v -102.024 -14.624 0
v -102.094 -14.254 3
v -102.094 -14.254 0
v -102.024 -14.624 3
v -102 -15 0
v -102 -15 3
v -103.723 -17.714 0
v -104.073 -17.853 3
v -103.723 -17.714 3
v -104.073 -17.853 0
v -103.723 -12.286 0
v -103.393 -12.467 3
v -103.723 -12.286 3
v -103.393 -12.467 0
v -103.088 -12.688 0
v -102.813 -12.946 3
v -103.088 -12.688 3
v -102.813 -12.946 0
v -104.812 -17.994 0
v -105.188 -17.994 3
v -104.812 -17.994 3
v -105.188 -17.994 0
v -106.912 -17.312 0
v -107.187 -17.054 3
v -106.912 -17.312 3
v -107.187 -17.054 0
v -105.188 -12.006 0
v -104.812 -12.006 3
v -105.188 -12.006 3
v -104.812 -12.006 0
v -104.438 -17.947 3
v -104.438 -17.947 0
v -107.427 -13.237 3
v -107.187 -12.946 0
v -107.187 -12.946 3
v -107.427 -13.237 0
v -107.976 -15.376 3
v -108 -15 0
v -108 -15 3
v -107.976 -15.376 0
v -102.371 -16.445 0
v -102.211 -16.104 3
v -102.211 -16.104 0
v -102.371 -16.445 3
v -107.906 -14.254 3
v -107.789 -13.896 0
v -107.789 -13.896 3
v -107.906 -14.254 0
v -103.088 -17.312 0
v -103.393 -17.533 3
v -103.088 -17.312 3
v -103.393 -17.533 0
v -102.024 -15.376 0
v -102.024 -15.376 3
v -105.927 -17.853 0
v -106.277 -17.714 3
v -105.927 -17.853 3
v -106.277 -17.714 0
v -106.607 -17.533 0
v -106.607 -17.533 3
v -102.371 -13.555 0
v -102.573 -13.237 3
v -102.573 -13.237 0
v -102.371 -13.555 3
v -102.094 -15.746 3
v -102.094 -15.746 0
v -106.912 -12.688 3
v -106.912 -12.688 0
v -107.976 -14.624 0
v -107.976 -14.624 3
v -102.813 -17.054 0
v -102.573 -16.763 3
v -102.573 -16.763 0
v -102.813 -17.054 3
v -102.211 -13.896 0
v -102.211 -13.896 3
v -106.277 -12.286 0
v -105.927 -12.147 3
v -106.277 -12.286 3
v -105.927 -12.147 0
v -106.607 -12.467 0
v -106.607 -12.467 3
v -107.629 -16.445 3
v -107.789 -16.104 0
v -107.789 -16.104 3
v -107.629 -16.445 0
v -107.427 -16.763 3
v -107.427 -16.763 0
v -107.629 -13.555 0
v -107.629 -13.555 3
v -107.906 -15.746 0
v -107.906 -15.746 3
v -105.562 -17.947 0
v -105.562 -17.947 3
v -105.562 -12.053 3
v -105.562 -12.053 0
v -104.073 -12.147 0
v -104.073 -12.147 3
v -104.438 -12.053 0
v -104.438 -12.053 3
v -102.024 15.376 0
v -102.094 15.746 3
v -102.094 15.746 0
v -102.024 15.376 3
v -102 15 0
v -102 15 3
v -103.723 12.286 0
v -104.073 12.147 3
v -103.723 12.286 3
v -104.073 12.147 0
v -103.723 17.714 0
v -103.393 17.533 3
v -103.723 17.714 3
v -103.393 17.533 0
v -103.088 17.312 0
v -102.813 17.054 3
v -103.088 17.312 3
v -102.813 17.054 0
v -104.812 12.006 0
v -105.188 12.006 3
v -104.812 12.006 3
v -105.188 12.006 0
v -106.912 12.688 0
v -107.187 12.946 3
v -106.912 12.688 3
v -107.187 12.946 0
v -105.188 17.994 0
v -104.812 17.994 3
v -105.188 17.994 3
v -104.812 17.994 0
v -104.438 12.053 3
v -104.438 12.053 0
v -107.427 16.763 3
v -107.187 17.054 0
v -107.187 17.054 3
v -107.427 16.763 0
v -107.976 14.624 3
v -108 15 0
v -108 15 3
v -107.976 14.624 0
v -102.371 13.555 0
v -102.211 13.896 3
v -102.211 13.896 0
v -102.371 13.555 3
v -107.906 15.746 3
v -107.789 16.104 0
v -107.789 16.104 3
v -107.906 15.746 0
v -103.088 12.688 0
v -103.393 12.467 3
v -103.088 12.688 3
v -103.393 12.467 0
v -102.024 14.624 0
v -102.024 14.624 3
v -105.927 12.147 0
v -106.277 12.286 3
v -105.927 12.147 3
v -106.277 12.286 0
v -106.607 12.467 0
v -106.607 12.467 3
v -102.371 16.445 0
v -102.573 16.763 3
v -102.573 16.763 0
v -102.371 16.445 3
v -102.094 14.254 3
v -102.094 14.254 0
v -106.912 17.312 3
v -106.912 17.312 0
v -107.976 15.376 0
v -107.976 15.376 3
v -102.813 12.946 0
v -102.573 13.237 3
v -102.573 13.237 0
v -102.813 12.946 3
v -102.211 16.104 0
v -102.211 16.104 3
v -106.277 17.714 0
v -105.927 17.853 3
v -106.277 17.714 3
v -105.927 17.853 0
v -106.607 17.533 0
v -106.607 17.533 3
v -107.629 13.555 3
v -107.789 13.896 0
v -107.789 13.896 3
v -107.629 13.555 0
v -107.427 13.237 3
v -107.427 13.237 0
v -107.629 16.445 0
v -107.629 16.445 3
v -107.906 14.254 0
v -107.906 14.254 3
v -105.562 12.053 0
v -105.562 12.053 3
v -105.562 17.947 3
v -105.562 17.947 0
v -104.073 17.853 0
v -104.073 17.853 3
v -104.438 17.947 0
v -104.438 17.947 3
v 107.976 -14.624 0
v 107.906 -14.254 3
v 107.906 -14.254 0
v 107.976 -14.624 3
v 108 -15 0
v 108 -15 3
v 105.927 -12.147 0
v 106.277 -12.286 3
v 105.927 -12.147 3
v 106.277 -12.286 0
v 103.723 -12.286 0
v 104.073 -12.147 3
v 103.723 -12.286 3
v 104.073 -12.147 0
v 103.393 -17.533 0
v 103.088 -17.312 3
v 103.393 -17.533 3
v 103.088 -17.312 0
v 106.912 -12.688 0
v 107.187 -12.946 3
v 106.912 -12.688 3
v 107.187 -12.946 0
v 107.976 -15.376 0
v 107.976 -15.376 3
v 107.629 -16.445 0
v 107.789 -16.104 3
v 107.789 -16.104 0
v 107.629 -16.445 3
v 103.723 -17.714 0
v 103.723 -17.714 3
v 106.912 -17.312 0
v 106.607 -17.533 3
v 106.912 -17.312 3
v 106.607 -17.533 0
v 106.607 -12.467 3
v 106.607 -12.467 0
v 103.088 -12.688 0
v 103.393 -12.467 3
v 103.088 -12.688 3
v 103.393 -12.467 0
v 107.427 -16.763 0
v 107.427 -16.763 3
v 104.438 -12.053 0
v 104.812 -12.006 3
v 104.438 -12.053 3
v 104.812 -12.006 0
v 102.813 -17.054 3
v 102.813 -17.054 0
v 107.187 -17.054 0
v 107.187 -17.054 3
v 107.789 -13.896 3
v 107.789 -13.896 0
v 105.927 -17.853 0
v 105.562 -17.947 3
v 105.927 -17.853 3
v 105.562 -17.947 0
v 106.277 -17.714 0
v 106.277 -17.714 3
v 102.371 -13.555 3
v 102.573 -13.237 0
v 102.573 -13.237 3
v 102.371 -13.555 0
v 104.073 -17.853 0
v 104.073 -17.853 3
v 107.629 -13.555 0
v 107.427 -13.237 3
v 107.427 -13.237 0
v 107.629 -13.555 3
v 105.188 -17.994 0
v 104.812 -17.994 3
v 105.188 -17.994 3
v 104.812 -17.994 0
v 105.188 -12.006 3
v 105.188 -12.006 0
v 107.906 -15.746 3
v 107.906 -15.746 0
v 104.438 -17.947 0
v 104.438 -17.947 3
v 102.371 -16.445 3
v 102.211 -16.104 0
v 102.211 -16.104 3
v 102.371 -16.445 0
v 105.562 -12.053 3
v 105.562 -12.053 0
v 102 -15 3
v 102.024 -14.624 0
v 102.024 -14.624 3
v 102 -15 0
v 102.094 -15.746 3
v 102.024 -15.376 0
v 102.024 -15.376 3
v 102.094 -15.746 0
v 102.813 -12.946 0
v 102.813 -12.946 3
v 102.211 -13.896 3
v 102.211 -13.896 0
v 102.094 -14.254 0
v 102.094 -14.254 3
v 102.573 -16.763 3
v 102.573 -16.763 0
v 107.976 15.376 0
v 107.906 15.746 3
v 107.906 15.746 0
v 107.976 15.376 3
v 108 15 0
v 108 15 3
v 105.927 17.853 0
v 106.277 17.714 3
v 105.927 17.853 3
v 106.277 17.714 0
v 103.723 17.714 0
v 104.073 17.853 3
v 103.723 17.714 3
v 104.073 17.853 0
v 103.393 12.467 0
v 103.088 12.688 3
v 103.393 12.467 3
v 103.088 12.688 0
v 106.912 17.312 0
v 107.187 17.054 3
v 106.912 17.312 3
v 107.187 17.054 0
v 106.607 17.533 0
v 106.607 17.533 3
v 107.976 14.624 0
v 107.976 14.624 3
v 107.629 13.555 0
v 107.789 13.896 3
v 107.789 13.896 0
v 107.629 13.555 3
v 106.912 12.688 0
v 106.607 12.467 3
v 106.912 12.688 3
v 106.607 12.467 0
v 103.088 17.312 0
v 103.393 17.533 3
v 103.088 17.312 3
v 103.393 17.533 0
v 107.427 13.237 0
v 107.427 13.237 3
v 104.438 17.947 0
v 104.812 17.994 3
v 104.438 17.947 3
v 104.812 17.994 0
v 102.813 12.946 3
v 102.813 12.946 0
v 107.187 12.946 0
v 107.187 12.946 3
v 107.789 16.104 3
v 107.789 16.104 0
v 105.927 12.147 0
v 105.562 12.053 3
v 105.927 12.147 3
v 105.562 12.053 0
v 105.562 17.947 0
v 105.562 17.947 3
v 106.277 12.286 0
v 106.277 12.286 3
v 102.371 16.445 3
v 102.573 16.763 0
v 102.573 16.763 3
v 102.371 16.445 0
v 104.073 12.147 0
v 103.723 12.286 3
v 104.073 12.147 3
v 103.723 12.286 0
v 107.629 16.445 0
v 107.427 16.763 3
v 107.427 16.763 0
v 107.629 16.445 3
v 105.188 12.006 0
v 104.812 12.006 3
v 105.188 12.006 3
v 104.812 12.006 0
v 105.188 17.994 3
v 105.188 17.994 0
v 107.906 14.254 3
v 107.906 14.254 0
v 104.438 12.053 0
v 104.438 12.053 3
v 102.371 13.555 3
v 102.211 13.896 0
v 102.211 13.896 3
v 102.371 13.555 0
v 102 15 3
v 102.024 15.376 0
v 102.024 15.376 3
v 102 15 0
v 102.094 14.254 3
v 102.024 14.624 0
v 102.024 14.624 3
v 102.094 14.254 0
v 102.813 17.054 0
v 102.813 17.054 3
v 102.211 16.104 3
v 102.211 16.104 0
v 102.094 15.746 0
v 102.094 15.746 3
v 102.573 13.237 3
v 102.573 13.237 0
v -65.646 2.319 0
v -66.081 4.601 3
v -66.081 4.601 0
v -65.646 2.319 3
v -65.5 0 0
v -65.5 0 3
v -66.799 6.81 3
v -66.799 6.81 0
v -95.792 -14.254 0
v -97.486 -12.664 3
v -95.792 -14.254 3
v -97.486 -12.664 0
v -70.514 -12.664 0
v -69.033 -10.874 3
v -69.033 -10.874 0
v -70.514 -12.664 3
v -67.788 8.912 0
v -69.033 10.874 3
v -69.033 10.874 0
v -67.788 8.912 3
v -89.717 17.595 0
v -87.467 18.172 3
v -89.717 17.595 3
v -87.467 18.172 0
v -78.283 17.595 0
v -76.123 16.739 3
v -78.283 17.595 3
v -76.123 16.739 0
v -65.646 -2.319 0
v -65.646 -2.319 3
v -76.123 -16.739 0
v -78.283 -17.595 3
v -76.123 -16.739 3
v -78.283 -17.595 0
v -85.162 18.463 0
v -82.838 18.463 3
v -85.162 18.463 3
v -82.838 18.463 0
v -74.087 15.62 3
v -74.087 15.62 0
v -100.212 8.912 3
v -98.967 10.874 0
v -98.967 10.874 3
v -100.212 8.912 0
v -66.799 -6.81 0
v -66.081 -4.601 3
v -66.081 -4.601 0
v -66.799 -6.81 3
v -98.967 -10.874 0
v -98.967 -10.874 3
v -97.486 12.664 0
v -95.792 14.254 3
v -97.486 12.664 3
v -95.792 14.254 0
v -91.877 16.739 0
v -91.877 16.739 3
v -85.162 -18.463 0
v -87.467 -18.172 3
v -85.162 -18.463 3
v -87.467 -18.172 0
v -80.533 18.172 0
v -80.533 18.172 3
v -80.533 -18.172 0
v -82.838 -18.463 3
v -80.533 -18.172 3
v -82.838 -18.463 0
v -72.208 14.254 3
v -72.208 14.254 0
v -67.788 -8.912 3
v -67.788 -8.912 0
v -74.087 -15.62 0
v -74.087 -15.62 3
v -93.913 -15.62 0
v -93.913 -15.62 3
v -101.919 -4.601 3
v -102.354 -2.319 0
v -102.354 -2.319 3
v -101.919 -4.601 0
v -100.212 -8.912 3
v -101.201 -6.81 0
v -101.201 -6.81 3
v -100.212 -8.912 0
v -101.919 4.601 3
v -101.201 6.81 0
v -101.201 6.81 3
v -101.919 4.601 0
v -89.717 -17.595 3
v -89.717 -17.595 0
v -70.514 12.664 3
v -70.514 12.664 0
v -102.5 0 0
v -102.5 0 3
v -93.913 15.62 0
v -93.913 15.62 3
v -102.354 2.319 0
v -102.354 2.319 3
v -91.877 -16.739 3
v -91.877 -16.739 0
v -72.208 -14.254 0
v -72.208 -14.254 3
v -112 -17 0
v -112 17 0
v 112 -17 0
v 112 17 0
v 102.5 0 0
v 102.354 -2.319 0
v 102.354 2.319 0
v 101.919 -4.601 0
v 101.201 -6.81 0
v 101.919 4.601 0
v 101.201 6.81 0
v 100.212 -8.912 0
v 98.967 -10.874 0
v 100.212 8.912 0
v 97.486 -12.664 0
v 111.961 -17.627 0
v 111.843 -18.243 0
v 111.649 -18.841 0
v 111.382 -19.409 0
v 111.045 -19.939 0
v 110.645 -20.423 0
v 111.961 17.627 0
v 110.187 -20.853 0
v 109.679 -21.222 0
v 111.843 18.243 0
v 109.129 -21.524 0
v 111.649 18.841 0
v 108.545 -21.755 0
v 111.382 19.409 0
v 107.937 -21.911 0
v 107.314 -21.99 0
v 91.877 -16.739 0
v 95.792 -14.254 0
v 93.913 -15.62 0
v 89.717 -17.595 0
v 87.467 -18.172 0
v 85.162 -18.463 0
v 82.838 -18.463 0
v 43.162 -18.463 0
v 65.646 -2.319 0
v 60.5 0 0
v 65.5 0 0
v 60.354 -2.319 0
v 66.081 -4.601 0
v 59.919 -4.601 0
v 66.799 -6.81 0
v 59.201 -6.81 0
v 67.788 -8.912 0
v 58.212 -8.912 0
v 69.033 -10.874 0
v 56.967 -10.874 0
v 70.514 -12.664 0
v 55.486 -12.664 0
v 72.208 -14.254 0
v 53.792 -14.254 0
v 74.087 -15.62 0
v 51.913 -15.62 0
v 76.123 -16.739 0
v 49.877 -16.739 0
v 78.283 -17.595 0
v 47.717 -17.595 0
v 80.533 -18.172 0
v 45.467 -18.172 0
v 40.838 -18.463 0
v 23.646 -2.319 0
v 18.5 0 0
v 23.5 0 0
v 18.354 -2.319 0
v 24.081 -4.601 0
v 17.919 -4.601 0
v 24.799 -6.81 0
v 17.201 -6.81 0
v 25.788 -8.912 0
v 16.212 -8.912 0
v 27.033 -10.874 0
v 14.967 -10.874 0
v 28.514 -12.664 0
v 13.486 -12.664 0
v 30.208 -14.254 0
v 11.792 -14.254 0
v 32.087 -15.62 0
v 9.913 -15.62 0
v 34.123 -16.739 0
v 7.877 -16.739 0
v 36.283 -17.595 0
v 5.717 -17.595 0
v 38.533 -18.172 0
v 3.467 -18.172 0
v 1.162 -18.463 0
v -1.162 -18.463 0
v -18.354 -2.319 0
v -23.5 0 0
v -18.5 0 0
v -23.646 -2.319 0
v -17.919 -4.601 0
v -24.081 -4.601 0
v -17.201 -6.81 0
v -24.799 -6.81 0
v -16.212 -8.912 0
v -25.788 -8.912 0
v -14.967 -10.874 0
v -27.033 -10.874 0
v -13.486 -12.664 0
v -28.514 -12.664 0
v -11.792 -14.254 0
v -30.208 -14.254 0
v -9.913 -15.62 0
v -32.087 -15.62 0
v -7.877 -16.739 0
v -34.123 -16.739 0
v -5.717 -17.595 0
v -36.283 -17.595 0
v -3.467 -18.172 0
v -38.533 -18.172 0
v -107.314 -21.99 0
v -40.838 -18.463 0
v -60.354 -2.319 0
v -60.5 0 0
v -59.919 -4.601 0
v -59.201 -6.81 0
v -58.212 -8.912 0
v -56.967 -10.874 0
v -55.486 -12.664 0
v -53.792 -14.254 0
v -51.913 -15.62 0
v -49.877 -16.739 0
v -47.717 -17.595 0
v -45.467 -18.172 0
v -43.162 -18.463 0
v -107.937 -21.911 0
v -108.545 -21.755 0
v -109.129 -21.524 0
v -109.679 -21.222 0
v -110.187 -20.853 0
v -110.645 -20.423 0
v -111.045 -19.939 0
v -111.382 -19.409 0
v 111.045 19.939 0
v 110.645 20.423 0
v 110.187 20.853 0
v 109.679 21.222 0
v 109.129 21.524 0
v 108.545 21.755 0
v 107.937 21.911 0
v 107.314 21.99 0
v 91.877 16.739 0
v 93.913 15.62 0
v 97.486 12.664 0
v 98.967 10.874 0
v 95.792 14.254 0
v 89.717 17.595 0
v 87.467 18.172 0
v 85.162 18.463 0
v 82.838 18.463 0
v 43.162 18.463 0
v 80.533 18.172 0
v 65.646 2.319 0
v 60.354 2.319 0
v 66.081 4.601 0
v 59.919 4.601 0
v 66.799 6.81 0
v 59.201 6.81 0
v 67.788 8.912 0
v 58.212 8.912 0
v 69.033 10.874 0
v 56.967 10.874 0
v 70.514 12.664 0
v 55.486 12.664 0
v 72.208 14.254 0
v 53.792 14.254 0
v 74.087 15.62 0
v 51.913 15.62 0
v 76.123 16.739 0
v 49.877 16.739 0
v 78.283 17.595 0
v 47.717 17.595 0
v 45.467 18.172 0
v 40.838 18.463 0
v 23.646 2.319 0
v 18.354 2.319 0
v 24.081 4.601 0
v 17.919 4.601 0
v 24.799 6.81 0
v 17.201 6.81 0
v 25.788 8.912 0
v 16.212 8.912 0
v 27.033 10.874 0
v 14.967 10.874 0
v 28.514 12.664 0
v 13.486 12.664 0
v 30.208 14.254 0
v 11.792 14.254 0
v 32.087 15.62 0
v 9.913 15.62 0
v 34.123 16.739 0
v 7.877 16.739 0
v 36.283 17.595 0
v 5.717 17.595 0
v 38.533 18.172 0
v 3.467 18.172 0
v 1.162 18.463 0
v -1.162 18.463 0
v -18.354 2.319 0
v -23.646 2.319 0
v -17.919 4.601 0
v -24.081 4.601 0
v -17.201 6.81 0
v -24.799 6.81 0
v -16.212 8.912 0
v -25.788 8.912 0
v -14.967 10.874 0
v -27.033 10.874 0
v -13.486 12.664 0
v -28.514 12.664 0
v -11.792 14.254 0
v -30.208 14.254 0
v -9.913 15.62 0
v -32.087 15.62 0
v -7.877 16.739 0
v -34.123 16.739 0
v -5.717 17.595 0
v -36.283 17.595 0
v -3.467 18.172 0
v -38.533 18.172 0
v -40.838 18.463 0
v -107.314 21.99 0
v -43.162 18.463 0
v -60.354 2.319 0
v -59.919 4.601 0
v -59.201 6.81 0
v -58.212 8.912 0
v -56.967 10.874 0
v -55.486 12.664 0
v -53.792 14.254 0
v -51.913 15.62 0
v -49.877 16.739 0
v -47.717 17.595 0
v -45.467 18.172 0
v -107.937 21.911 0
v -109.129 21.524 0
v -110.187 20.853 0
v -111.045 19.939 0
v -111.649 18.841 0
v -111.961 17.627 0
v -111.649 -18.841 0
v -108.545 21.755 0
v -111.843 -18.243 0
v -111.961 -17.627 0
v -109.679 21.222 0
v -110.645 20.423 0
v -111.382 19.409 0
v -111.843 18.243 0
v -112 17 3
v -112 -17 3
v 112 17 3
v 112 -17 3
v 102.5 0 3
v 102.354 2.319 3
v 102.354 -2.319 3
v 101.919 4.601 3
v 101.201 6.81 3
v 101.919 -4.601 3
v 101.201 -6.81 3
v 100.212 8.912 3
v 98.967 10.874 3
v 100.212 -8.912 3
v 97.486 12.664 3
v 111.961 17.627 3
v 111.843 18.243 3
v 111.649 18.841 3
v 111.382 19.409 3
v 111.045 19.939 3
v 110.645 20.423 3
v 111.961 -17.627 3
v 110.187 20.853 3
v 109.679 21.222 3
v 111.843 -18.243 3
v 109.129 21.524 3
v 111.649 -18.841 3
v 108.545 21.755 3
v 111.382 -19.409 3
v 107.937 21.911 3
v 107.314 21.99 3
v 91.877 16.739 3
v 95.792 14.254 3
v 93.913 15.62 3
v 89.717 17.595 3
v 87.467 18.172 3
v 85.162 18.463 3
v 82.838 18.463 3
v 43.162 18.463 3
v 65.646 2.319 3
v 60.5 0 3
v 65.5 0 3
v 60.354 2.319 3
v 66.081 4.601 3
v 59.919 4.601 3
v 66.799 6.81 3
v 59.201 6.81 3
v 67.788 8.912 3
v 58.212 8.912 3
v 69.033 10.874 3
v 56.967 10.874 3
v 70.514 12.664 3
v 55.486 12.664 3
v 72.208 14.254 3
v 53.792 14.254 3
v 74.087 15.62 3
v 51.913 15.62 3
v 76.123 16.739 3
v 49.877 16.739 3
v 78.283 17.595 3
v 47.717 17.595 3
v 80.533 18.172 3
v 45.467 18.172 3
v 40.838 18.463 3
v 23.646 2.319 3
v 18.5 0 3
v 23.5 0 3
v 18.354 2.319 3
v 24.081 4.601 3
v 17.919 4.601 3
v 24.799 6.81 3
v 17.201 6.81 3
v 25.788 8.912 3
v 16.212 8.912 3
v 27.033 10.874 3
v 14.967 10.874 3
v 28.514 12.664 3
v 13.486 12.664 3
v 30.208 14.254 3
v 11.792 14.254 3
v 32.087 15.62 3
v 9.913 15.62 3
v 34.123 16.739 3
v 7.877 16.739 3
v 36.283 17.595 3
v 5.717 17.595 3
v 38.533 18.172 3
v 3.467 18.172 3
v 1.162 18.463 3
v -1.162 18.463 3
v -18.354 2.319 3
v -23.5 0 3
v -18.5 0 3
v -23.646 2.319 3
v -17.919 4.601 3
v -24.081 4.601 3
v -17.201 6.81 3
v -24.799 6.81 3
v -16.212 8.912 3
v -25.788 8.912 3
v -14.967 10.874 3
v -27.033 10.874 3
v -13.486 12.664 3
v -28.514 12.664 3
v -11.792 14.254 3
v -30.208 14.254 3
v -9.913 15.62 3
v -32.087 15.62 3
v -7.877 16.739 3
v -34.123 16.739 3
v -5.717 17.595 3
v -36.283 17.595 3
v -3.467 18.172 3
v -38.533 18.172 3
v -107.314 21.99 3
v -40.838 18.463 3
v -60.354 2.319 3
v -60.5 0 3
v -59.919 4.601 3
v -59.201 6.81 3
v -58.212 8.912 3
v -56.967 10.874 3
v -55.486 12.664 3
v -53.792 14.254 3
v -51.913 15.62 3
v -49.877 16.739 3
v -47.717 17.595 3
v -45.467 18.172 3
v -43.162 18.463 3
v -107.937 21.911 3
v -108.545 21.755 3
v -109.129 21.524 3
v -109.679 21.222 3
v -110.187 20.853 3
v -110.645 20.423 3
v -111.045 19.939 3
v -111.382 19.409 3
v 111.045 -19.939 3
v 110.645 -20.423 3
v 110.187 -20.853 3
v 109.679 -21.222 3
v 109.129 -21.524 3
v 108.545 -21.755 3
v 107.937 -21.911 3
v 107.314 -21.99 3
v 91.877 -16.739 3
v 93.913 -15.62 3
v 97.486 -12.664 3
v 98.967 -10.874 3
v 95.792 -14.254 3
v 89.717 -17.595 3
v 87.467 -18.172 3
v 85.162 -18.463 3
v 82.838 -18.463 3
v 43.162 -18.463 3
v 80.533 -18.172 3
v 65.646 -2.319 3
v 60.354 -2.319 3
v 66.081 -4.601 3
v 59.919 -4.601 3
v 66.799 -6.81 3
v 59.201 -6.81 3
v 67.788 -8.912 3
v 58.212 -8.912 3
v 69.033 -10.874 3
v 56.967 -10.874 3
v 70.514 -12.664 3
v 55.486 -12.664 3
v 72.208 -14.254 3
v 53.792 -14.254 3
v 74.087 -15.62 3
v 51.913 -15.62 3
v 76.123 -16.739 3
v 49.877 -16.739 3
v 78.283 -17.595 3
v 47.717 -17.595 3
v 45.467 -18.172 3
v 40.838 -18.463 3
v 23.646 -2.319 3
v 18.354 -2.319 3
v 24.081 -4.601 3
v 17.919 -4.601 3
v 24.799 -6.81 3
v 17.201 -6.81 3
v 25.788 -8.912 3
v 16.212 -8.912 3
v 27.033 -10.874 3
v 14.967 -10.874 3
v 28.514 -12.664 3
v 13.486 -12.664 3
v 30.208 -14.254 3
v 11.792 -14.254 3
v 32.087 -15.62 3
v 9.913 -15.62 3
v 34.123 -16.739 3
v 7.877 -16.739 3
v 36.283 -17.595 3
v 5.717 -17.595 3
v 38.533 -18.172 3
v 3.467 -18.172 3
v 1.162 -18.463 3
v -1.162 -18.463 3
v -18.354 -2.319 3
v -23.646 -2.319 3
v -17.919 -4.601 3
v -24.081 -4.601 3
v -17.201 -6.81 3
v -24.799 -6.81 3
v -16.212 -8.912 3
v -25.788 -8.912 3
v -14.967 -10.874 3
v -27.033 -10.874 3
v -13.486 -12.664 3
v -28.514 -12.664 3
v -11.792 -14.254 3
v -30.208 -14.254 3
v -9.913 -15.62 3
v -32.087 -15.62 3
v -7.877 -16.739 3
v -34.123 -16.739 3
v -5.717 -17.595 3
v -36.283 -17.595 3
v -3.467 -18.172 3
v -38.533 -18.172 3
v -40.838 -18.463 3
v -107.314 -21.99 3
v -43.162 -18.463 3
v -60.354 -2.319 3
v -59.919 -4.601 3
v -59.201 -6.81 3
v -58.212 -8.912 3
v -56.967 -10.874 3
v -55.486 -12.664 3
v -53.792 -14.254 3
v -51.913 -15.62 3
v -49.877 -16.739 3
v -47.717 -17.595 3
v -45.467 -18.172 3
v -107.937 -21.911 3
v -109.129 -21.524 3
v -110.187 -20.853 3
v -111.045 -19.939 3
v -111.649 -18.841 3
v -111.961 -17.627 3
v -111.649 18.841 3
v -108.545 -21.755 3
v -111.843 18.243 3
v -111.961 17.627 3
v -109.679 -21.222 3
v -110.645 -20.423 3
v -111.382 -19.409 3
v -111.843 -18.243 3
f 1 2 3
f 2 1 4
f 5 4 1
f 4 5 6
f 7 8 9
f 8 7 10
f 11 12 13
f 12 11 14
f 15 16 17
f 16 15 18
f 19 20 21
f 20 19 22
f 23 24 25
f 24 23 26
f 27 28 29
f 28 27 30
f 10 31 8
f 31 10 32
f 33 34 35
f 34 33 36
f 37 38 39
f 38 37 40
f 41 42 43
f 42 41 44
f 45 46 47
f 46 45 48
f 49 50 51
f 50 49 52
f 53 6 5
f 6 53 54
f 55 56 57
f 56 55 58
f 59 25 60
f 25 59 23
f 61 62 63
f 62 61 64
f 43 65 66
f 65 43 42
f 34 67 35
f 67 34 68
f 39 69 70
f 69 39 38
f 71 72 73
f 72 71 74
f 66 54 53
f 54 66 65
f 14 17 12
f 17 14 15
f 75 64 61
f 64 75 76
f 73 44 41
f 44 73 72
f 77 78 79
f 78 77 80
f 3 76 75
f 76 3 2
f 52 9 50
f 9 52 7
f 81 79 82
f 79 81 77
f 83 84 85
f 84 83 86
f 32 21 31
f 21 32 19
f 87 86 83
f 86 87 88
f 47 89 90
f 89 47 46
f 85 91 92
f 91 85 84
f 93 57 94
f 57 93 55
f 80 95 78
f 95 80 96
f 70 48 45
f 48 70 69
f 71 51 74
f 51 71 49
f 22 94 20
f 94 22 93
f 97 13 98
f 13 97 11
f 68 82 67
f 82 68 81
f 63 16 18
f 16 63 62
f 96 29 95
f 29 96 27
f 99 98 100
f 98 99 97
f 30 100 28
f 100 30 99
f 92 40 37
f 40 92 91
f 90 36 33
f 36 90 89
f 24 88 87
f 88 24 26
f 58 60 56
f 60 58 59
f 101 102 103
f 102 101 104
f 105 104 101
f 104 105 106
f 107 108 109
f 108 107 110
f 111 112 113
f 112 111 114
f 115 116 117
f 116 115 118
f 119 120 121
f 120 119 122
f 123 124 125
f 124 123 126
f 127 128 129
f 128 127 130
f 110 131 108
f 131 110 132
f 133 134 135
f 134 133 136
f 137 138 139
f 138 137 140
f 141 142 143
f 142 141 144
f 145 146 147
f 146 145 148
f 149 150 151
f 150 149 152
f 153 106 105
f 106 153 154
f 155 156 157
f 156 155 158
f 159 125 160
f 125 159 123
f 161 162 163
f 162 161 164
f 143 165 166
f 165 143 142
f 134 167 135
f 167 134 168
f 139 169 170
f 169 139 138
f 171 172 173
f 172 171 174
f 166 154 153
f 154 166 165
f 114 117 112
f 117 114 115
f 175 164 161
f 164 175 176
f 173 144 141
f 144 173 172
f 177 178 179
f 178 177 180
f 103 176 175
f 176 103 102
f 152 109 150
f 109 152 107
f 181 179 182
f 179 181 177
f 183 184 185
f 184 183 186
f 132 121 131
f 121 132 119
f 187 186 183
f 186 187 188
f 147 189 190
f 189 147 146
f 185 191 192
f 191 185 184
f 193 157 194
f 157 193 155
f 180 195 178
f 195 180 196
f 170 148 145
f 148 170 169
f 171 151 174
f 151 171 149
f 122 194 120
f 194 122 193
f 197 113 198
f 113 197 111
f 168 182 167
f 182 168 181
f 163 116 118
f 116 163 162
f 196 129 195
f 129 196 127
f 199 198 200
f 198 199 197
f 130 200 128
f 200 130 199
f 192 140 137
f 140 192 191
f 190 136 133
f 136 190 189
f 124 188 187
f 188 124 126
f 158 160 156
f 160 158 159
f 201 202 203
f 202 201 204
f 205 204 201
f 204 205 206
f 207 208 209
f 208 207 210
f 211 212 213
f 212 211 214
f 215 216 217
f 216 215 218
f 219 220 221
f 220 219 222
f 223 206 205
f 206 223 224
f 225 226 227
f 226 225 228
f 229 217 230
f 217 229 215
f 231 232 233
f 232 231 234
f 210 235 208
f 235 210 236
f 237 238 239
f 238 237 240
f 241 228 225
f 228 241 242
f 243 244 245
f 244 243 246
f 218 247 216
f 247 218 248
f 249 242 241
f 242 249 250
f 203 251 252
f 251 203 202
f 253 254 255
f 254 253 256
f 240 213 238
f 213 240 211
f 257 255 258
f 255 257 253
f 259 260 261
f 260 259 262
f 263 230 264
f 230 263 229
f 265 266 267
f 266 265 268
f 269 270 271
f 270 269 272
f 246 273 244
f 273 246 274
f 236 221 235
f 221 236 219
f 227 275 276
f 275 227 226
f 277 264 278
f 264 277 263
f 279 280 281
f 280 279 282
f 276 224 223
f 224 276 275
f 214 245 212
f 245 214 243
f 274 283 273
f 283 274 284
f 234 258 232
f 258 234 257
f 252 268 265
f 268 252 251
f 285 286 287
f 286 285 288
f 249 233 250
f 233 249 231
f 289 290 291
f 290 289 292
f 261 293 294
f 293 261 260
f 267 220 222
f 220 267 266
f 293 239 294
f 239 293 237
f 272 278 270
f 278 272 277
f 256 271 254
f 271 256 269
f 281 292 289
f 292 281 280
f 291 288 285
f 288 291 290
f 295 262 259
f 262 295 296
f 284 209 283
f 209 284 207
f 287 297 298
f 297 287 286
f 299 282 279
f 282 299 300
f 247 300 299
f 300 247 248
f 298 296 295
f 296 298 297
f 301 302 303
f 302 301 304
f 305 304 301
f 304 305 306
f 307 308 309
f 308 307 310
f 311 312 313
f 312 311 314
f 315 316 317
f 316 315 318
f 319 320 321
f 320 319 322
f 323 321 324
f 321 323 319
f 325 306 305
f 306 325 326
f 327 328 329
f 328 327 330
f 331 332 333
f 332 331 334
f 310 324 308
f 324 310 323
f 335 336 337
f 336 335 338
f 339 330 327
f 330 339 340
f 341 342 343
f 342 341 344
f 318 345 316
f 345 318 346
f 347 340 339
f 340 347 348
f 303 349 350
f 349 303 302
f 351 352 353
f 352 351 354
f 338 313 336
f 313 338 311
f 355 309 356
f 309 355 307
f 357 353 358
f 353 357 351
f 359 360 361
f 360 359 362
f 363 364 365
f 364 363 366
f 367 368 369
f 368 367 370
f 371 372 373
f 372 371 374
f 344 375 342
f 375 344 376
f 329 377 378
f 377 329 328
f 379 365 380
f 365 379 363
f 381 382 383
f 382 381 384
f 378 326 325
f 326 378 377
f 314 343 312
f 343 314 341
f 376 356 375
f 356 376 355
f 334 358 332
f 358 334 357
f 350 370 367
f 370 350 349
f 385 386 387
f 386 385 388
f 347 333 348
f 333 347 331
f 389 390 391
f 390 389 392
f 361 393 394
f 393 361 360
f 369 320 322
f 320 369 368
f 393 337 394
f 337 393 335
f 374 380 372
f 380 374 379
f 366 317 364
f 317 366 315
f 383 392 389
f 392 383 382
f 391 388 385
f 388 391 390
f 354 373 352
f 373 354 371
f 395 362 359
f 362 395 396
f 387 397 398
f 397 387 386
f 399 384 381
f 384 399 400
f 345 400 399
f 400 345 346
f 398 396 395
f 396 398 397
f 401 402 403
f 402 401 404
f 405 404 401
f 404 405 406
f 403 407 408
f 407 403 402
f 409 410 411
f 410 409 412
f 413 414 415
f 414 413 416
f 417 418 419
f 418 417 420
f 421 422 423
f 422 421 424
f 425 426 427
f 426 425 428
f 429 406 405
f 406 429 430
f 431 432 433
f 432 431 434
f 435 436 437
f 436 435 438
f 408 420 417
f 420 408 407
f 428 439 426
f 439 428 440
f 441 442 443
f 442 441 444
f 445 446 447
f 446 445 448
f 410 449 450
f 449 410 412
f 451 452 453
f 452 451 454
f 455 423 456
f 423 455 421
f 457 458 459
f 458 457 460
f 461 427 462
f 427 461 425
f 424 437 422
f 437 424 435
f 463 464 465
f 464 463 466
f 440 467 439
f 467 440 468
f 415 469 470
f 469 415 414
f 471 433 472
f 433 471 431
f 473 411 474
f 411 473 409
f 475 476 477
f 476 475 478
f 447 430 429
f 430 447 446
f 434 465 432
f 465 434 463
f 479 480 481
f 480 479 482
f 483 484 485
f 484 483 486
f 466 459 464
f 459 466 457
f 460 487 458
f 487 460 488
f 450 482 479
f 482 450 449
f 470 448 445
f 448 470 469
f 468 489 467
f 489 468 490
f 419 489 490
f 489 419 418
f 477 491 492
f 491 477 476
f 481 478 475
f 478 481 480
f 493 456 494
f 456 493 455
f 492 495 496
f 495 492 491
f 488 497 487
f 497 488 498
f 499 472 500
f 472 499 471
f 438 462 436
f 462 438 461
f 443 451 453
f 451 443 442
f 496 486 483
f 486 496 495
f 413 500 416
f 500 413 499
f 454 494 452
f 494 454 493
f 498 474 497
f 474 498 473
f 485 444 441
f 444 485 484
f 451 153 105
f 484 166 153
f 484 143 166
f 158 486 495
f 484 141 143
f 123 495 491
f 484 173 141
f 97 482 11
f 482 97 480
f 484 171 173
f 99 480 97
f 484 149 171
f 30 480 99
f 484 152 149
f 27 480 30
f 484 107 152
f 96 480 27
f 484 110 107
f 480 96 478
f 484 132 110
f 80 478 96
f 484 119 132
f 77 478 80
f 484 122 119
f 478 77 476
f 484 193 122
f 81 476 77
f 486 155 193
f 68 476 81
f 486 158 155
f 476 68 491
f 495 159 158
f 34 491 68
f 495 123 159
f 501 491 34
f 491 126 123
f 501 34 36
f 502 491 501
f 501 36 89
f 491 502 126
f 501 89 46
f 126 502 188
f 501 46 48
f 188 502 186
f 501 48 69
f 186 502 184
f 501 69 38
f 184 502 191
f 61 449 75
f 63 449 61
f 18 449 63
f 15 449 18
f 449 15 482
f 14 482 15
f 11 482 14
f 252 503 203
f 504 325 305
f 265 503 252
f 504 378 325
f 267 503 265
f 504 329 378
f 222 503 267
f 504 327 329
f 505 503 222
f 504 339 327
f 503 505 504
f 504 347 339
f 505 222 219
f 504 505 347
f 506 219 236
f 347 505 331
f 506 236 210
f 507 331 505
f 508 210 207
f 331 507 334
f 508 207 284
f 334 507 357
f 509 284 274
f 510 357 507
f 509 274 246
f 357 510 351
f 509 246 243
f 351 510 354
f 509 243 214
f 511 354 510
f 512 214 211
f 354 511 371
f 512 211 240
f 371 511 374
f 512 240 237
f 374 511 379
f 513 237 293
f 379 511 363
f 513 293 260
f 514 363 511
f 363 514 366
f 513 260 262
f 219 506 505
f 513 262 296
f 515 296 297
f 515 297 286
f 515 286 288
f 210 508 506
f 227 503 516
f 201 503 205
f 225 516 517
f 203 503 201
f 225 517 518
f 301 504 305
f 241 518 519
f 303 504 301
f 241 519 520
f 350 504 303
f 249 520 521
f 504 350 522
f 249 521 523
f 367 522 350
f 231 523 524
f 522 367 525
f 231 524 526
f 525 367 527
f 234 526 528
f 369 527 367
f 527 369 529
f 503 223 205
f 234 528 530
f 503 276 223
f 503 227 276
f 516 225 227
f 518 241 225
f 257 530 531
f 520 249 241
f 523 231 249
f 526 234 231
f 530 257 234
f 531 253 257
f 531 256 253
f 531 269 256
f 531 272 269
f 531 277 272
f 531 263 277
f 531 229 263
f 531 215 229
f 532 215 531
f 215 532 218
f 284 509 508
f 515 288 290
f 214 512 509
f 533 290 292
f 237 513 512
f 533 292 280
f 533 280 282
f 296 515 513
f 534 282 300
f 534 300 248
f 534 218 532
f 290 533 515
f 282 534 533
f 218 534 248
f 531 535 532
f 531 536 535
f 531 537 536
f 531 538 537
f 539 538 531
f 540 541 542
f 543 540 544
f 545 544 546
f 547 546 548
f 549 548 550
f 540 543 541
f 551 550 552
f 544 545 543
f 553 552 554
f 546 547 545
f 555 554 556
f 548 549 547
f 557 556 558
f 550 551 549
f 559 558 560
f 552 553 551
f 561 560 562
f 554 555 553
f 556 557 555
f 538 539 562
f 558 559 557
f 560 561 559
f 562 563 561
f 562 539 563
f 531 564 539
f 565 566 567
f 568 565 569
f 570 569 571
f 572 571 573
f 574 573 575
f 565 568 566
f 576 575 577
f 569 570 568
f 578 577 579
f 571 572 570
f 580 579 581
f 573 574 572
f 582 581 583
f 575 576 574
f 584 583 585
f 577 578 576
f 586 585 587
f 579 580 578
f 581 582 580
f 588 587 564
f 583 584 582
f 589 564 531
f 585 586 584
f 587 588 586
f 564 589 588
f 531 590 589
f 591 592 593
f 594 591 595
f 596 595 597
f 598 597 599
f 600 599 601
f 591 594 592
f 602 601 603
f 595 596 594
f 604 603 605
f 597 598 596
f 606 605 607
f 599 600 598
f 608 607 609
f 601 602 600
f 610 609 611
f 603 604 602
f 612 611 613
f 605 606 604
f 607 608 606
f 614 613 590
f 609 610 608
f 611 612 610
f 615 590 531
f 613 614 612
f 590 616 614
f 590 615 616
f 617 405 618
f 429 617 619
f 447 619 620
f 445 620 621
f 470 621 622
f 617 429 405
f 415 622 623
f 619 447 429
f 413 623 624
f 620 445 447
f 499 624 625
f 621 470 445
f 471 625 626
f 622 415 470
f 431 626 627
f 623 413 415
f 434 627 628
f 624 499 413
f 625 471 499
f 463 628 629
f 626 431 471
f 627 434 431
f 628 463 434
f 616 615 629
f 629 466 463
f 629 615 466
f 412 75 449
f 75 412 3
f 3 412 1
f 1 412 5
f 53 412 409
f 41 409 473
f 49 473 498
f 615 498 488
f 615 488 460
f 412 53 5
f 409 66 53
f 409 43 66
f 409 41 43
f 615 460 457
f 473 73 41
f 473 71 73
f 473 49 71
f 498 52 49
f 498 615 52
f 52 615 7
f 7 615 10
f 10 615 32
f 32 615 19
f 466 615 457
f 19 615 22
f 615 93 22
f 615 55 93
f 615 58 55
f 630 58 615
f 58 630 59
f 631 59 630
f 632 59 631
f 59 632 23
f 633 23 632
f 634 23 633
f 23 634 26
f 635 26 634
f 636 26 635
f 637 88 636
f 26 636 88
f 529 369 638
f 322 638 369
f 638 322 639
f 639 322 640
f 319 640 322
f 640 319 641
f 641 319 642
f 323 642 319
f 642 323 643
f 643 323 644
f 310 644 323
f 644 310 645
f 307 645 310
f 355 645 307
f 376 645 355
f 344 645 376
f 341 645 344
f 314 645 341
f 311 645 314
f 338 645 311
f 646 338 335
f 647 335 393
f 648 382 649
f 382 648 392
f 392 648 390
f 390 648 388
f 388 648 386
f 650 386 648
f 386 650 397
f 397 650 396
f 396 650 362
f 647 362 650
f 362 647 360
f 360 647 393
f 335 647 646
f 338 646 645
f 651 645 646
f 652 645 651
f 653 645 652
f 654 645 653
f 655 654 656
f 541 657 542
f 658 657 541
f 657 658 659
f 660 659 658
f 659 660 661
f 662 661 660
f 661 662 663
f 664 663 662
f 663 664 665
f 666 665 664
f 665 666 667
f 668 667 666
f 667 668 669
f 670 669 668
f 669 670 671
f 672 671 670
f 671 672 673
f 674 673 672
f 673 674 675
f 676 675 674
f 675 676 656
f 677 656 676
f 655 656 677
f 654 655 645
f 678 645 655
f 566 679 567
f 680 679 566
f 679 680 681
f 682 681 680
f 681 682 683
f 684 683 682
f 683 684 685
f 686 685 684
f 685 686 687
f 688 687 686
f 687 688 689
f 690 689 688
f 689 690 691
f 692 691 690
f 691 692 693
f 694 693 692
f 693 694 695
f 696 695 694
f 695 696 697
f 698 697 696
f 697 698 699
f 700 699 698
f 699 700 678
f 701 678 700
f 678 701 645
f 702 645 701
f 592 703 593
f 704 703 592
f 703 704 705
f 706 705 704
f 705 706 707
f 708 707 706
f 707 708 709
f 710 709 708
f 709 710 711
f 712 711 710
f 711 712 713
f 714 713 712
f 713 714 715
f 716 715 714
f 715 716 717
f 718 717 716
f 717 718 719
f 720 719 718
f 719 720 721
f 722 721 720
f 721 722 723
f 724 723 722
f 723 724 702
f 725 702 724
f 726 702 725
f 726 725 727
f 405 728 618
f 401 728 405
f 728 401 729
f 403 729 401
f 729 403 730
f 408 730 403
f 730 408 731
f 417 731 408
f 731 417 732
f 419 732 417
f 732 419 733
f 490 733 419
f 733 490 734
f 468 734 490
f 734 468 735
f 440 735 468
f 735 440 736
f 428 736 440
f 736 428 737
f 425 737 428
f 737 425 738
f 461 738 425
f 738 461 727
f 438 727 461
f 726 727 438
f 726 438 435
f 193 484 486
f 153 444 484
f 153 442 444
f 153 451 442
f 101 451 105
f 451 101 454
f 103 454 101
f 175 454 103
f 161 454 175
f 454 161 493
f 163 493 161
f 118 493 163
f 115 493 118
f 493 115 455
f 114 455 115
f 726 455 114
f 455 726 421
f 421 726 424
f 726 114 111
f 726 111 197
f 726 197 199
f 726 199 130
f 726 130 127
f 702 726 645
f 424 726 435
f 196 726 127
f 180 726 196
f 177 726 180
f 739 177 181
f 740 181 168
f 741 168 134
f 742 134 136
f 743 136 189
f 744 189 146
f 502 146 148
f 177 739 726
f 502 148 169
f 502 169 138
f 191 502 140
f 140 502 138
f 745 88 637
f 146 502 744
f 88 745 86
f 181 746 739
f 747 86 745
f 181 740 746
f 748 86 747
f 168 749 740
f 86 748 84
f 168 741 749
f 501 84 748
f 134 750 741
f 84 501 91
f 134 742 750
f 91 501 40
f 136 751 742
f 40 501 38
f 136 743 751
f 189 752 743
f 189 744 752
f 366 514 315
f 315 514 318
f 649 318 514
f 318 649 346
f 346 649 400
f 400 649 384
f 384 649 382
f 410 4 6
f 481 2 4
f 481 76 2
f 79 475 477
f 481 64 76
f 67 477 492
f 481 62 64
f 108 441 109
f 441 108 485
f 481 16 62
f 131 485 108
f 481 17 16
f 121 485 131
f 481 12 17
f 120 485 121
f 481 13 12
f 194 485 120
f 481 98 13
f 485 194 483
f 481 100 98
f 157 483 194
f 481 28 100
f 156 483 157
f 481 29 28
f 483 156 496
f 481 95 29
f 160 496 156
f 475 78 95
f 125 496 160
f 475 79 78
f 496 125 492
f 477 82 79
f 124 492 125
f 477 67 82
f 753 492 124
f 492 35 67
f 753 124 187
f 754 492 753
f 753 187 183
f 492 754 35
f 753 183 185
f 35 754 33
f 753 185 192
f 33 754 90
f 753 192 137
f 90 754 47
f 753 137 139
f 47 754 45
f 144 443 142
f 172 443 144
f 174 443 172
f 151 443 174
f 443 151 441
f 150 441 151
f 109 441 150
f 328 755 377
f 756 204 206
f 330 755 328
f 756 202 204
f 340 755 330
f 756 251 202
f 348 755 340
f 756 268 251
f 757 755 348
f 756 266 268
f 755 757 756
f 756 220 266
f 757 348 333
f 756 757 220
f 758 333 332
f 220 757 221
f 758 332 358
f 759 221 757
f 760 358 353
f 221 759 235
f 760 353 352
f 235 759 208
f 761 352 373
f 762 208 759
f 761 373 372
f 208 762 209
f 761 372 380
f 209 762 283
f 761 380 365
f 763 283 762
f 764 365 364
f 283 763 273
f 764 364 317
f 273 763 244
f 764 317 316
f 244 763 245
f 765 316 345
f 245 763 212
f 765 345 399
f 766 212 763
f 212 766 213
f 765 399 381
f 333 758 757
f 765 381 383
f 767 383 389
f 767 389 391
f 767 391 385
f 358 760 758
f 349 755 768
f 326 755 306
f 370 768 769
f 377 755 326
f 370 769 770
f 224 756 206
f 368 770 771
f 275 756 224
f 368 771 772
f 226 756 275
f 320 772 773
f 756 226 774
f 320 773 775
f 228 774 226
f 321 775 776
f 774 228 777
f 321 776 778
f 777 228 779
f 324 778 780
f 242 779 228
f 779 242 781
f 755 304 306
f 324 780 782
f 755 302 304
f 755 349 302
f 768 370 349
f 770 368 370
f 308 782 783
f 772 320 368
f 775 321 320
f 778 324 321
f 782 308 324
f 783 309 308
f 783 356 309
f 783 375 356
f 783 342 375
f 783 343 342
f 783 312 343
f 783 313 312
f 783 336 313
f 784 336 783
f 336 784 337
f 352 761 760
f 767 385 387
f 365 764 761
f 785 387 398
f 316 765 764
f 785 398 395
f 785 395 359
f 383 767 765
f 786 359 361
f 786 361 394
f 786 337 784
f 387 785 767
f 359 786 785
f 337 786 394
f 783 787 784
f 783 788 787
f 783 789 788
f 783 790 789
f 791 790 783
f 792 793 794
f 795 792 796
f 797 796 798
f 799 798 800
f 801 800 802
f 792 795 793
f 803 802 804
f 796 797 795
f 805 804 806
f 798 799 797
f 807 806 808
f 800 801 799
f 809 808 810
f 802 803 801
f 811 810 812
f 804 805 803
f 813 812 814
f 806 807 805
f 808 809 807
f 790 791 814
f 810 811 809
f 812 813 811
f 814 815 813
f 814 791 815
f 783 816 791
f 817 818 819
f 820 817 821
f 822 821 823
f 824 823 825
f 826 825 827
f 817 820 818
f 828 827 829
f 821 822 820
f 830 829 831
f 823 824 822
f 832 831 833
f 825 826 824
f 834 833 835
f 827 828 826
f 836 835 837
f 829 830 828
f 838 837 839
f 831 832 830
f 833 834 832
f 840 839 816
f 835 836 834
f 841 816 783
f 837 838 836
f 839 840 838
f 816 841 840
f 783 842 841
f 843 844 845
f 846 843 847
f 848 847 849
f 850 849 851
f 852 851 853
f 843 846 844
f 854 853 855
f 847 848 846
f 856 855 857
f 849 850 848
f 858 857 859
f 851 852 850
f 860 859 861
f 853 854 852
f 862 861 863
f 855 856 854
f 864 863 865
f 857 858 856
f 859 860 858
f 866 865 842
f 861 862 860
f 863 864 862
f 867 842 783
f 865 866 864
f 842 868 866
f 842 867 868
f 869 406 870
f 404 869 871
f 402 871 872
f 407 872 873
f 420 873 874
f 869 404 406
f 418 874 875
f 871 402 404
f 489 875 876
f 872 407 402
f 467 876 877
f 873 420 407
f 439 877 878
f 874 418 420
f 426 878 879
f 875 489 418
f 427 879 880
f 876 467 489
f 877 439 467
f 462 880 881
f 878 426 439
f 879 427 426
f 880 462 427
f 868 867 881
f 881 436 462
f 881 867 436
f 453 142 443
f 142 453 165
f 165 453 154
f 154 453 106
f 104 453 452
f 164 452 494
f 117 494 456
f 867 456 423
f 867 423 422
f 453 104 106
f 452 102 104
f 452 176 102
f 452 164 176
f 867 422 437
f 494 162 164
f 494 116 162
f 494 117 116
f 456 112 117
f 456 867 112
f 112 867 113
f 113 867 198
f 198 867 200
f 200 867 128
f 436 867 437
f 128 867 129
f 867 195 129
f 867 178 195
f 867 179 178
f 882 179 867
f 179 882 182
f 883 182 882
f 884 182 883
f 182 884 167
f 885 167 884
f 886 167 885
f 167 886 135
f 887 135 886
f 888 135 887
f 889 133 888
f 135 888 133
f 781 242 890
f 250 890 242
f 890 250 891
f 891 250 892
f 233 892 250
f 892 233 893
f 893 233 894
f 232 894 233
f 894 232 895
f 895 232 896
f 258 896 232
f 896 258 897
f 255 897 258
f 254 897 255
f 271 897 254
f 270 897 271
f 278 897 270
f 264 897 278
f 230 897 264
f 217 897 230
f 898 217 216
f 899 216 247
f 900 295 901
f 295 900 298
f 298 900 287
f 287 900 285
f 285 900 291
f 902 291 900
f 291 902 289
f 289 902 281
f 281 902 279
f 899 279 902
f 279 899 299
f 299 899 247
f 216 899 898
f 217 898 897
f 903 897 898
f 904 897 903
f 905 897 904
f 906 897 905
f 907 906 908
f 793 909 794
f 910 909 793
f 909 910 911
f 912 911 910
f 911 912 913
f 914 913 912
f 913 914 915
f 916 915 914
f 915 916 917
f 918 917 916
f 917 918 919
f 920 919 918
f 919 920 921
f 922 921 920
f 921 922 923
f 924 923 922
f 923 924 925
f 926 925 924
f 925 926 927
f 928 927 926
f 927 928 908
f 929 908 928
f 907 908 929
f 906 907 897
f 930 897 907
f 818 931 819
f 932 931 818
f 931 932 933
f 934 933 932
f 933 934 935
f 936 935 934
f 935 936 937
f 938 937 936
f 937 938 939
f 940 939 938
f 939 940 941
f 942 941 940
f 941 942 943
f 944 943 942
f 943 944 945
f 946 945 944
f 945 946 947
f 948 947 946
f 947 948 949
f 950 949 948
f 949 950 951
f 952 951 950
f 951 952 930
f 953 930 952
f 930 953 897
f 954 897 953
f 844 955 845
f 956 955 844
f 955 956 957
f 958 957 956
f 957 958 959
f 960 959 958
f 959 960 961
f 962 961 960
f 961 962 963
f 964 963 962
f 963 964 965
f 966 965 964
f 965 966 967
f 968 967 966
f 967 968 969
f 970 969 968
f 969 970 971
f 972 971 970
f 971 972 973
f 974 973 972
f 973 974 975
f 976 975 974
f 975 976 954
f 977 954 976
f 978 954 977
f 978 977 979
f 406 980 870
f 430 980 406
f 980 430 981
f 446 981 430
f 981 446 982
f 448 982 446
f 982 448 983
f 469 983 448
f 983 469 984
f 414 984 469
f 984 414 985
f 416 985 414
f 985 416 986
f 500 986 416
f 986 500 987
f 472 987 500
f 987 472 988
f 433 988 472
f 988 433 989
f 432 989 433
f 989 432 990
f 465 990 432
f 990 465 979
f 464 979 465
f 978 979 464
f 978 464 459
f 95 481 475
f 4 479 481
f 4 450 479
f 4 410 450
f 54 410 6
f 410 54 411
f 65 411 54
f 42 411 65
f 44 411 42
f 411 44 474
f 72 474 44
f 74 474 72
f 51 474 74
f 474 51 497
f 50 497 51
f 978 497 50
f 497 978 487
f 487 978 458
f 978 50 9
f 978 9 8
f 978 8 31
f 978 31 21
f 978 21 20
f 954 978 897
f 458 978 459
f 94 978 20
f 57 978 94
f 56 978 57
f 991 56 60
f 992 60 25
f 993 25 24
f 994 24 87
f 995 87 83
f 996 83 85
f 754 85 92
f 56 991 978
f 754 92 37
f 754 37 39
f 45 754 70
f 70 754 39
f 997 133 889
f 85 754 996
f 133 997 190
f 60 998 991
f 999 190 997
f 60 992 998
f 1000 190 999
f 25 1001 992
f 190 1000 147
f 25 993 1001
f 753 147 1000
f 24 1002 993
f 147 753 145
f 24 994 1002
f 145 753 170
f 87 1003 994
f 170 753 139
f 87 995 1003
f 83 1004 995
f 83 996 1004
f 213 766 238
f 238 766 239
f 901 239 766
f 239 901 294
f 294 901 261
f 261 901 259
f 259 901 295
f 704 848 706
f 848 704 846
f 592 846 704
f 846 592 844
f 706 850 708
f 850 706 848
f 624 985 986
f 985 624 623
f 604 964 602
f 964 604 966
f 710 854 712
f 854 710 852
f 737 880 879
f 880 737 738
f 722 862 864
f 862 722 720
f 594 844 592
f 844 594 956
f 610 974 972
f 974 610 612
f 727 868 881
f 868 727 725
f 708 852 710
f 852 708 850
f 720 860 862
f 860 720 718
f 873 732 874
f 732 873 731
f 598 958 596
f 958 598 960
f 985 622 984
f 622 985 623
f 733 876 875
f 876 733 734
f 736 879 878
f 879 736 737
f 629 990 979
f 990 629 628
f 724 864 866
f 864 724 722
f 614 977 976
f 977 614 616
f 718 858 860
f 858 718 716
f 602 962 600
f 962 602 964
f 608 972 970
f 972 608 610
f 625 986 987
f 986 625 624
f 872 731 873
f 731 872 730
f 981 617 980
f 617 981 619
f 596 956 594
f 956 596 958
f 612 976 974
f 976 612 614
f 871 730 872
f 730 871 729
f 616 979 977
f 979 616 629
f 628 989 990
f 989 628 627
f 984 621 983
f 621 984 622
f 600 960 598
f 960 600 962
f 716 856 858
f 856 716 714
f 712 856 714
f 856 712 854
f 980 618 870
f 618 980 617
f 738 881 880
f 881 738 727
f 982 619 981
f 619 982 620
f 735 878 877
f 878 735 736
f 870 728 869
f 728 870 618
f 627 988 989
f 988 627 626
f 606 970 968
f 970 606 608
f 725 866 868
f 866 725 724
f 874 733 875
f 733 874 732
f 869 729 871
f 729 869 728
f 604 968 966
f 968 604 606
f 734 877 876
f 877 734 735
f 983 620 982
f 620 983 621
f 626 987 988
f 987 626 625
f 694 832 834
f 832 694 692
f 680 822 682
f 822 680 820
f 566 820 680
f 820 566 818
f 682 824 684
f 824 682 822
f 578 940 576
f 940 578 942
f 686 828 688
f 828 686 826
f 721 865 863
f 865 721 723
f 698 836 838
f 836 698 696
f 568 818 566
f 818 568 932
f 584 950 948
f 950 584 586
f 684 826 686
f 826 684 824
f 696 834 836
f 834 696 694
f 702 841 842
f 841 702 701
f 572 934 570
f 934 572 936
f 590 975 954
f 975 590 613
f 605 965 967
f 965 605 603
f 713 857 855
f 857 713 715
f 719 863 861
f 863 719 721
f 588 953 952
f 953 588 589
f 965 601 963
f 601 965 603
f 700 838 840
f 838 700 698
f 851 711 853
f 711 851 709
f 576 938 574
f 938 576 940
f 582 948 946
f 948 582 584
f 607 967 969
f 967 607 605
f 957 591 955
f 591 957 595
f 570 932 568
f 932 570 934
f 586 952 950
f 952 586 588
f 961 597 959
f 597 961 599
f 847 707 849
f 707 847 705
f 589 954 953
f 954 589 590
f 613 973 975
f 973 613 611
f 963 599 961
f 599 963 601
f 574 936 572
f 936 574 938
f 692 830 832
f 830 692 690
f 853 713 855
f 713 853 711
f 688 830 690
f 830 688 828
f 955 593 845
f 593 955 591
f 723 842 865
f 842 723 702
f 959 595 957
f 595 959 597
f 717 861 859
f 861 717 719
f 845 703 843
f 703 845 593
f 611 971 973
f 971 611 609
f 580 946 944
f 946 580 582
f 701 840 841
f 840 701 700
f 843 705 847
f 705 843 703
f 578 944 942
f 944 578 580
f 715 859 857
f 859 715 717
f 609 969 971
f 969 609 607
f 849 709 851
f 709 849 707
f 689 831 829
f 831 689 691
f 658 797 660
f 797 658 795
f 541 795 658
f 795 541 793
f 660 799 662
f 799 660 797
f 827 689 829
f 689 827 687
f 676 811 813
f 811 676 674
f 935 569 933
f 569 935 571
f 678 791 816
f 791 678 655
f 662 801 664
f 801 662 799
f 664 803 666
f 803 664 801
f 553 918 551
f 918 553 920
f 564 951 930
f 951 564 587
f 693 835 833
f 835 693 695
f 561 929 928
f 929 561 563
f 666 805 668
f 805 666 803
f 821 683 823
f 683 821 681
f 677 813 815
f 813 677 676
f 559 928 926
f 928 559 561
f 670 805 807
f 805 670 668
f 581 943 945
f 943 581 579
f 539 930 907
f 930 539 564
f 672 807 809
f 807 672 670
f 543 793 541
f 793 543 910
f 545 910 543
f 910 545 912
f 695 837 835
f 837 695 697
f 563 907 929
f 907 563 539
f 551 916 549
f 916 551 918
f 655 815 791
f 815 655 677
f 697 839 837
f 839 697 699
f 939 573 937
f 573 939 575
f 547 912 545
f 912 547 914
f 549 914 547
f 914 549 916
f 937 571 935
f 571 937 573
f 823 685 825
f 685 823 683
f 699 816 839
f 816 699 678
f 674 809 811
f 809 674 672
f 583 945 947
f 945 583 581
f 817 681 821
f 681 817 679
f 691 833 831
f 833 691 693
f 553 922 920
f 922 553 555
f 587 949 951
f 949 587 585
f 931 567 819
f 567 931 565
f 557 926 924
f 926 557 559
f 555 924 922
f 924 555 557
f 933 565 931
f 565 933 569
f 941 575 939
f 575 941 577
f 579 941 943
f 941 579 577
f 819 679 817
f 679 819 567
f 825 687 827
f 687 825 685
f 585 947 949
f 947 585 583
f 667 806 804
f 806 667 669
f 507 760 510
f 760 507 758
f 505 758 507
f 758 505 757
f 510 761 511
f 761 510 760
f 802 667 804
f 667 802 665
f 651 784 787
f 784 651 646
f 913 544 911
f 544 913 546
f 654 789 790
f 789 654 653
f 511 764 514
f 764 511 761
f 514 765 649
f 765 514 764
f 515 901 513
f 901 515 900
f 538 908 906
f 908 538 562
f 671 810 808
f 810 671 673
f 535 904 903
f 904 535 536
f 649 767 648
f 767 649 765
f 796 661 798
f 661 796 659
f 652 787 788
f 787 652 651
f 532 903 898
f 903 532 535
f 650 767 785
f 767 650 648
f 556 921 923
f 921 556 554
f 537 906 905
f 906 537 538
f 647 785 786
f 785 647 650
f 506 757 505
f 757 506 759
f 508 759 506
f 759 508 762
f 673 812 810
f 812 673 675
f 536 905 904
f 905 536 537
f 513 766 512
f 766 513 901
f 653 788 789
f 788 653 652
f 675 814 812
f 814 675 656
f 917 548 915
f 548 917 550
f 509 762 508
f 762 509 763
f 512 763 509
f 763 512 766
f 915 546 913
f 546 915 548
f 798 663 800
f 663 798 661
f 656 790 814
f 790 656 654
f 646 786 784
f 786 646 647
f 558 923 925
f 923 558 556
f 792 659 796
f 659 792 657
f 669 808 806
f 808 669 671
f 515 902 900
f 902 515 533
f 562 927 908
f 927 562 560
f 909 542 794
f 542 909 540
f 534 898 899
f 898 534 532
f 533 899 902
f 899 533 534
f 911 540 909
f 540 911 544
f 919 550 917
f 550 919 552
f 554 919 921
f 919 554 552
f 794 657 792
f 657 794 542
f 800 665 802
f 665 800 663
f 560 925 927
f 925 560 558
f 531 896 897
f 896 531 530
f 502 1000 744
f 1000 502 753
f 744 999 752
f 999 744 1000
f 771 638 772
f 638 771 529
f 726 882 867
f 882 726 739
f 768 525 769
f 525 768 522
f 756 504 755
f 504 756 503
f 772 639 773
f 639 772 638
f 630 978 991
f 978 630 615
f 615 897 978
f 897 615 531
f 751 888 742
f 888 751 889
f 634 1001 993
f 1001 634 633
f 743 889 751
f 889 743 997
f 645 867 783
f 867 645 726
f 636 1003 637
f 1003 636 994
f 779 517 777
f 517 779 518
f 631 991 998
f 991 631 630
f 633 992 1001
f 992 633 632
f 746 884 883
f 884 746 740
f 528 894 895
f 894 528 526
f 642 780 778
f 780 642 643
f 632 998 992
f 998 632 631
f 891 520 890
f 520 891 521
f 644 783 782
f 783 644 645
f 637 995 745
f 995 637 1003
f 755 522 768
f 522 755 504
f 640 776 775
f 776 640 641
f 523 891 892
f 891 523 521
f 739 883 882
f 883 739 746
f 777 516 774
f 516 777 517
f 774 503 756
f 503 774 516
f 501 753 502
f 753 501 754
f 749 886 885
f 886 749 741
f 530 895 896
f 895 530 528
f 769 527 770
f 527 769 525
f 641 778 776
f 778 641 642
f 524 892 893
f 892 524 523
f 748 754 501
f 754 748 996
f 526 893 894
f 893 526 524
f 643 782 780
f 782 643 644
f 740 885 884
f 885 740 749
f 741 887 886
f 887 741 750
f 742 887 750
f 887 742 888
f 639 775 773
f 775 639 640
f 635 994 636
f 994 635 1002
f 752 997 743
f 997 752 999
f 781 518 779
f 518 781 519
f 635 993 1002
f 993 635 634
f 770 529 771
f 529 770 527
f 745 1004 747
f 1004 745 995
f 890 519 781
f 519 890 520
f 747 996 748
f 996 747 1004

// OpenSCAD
$fn = 50;


difference() {
	union() {
		hull() {
			translate(v = [-107.0000000000, 17.0000000000, 0]) {
				cylinder(h = 3, r = 5);
			}
			translate(v = [107.0000000000, 17.0000000000, 0]) {
				cylinder(h = 3, r = 5);
			}
			translate(v = [-107.0000000000, -17.0000000000, 0]) {
				cylinder(h = 3, r = 5);
			}
			translate(v = [107.0000000000, -17.0000000000, 0]) {
				cylinder(h = 3, r = 5);
			}
		}
	}
	union() {
		#translate(v = [-105.0000000000, -15.0000000000, -100.0000000000]) {
			cylinder(h = 200, r = 3.0000000000);
		}
		#translate(v = [-105.0000000000, 15.0000000000, -100.0000000000]) {
			cylinder(h = 200, r = 3.0000000000);
		}
		#translate(v = [105.0000000000, -15.0000000000, -100.0000000000]) {
			cylinder(h = 200, r = 3.0000000000);
		}
		#translate(v = [105.0000000000, 15.0000000000, -100.0000000000]) {
			cylinder(h = 200, r = 3.0000000000);
		}
		#translate(v = [-84.0000000000, 0, 0]) {
			cylinder(h = 3, r = 18.5000000000);
		}
		#translate(v = [-42.0000000000, 0, 0]) {
			cylinder(h = 3, r = 18.5000000000);
		}
		#cylinder(h = 3, r = 18.5000000000);
		#translate(v = [42.0000000000, 0, 0]) {
			cylinder(h = 3, r = 18.5000000000);
		}
		#translate(v = [84.0000000000, 0, 0]) {
			cylinder(h = 3, r = 18.5000000000);
		}
	}
}
